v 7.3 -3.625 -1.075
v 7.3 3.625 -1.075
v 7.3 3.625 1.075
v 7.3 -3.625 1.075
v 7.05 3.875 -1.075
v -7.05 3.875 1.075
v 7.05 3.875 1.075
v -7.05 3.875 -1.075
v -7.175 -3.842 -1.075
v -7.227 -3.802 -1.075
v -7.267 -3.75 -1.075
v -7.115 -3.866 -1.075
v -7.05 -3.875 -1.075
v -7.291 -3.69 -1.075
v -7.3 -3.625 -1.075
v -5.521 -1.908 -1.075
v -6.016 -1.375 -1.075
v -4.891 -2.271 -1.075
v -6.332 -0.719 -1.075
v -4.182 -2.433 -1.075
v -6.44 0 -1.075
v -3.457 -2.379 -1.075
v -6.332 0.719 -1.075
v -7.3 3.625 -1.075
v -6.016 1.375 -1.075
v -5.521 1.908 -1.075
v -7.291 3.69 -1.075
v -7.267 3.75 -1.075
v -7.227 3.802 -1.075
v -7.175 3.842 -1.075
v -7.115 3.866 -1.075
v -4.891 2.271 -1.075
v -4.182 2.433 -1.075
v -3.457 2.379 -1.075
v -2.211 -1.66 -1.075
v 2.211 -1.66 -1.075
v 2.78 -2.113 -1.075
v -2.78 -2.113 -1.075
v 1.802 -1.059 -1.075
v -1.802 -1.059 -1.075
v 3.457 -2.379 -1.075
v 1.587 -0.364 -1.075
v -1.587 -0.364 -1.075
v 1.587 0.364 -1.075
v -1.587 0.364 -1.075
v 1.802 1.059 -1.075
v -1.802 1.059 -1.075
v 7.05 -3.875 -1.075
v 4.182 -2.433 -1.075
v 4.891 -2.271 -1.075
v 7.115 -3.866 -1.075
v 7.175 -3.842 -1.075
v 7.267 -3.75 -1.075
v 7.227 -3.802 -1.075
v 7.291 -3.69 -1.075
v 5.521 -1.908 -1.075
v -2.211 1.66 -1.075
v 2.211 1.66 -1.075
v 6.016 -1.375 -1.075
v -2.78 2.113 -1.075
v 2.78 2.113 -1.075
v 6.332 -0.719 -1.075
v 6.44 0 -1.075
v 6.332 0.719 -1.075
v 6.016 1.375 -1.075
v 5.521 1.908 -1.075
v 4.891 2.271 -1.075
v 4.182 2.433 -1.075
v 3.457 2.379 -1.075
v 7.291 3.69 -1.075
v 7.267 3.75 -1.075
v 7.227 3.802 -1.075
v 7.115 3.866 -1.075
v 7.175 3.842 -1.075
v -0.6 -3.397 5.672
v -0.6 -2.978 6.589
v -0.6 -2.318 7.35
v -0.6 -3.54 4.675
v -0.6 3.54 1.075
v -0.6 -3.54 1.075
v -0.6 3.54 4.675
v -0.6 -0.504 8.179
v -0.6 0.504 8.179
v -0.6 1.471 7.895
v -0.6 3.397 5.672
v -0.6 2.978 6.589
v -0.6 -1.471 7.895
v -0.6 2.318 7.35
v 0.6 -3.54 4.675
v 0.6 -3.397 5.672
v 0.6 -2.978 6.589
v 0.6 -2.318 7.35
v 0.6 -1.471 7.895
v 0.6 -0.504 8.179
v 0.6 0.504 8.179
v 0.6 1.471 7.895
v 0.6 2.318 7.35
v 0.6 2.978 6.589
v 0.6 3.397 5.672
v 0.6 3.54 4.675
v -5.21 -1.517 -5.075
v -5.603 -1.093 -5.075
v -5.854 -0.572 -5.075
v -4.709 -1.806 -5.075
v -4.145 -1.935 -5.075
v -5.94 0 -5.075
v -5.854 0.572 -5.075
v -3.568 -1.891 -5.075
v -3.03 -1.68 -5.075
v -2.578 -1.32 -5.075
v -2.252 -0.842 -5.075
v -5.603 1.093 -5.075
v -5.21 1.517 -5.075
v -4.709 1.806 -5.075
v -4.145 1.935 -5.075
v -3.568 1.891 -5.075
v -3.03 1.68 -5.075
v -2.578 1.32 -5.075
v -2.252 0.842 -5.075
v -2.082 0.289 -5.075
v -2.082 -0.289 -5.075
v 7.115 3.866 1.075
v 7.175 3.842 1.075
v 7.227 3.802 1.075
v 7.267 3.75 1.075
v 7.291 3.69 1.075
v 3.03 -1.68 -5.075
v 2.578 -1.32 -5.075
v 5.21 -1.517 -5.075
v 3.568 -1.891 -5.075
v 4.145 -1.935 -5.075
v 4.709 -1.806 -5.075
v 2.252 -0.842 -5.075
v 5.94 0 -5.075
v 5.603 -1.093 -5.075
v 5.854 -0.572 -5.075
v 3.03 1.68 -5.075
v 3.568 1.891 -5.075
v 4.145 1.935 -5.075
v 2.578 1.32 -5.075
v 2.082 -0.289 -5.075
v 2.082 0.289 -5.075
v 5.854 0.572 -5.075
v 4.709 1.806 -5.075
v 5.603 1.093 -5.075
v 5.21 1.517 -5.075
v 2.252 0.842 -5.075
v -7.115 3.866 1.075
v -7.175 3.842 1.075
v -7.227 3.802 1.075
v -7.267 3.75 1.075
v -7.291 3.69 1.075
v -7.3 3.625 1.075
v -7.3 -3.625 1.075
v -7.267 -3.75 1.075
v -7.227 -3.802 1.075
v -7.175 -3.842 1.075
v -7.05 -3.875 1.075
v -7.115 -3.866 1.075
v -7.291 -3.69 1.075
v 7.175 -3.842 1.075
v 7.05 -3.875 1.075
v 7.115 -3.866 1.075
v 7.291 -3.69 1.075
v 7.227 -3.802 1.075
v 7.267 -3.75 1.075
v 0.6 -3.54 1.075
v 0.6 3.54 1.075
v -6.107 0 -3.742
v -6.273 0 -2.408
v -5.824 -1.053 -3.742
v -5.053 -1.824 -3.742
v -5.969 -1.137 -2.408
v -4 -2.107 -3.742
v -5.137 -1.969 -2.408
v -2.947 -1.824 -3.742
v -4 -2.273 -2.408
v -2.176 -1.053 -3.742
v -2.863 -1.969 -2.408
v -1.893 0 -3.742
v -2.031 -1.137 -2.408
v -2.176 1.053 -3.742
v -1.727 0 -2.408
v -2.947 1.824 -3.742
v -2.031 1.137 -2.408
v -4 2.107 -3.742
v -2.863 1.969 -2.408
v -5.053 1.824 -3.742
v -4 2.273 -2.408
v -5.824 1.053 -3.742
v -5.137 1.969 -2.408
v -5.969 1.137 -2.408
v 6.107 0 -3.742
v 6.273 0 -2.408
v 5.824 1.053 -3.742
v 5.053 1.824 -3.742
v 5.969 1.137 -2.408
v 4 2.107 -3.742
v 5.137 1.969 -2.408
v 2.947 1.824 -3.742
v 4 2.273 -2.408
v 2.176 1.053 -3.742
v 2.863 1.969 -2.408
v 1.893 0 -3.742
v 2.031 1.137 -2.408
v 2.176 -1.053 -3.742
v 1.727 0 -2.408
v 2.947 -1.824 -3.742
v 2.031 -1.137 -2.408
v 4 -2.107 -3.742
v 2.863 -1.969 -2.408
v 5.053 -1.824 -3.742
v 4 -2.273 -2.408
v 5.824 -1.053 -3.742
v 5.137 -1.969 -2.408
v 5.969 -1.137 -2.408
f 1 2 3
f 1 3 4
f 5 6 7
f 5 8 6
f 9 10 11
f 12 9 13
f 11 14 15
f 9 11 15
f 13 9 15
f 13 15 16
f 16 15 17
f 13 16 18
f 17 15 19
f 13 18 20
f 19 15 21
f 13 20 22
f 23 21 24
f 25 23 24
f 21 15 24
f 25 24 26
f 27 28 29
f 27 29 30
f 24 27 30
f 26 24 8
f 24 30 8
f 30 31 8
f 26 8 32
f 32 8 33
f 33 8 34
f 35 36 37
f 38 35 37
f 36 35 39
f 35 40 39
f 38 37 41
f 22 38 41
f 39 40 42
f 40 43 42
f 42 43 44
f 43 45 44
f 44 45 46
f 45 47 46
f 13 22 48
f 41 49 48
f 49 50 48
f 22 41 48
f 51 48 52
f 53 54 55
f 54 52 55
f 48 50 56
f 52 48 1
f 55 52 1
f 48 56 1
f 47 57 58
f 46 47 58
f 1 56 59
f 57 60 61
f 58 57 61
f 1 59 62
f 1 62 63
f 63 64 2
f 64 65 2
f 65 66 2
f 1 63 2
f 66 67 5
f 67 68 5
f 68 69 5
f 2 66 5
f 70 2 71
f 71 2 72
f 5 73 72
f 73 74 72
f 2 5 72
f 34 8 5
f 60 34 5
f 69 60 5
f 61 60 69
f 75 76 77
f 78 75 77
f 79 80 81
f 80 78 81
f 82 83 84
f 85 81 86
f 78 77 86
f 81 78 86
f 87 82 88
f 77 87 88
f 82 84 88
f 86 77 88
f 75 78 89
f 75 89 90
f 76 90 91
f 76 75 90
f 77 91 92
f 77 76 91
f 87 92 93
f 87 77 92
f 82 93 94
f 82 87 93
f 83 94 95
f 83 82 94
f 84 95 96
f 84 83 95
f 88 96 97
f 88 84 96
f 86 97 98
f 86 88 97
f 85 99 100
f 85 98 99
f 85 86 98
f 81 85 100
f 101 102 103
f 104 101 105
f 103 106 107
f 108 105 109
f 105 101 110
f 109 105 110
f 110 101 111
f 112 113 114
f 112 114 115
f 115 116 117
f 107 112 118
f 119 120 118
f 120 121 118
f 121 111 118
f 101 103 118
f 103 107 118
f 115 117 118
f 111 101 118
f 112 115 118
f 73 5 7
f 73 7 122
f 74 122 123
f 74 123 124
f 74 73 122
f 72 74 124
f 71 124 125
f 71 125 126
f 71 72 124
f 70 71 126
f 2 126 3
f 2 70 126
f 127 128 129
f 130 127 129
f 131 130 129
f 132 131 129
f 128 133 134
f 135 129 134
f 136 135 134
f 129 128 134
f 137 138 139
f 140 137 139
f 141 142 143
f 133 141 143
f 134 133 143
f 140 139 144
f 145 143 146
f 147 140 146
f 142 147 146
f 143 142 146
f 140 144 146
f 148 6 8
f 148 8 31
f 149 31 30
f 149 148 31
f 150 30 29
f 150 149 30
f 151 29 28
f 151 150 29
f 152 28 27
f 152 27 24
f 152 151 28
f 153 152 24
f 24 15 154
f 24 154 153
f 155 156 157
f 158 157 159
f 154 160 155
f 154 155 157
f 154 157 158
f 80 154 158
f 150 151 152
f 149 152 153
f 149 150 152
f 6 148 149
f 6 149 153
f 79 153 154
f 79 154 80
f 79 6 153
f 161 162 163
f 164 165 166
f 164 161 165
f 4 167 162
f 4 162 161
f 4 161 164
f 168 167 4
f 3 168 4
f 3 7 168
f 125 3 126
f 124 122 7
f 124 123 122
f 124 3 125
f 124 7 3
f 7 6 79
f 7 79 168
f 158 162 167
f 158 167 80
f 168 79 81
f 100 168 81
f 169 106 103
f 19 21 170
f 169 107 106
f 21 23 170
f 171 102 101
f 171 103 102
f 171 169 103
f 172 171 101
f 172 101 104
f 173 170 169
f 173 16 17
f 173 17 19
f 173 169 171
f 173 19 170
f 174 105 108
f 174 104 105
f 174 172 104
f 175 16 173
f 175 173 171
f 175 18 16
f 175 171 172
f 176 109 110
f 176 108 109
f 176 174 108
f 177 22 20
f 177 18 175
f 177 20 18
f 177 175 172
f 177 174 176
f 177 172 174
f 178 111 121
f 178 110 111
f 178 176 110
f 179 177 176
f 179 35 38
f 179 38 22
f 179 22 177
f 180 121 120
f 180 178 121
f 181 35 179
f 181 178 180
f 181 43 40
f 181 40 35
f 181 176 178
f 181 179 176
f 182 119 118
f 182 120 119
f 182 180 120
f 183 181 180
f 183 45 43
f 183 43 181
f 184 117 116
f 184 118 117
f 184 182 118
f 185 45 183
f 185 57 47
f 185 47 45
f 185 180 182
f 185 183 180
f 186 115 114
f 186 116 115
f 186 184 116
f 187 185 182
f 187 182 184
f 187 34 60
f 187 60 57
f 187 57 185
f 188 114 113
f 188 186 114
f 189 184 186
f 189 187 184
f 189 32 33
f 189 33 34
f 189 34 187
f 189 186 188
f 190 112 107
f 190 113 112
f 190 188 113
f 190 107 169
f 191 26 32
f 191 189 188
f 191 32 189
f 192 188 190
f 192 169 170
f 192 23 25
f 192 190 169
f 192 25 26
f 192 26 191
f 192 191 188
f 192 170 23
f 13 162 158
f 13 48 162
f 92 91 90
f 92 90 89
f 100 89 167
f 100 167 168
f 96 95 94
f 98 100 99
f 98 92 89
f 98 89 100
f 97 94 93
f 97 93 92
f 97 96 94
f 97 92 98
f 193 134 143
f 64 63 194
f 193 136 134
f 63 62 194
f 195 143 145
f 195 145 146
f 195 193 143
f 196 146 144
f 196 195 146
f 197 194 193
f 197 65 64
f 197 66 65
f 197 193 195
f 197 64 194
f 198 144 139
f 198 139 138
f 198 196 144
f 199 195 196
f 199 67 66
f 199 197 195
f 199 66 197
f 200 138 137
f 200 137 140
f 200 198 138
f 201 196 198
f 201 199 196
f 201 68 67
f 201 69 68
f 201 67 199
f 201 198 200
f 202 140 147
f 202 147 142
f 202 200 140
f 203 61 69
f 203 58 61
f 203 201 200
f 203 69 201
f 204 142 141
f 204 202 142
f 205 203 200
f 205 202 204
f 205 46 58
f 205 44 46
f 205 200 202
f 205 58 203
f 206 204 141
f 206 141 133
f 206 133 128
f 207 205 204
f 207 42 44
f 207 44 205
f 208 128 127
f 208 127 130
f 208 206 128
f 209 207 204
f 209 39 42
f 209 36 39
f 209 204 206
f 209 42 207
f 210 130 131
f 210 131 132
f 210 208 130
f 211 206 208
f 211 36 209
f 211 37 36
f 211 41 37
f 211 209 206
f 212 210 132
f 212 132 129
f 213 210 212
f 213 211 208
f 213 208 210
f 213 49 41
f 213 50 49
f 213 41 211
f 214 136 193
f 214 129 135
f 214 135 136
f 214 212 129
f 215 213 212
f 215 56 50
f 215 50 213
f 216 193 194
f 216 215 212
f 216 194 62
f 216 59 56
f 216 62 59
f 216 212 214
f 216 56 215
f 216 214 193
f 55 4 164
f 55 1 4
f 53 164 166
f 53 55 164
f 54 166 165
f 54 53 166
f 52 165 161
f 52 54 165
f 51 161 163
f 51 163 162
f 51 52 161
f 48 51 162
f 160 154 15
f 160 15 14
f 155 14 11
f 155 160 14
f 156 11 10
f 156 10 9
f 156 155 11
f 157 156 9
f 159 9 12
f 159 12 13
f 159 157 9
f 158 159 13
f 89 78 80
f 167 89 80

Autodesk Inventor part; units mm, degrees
ref_plane "YZ Plane" through (0, 0, 0) normal (1, 0, 0) x (0, 1, 0)
ref_plane "XZ Plane" through (0, 0, 0) normal (0, 1, 0) x (-1, 0, 0)
ref_plane "XY Plane" through (0, 0, 0) normal (0, 0, 1) x (1, 0, 0)
sketch "Sketch1" plane through (0, 0, 0) normal (0, 0, 1) x (1, 0, 0)
  line L0 (-7.3, 3.875) -> (7.3, 3.875)
  line L1 (7.3, 3.875) -> (7.3, -3.875)
  line L2 (7.3, -3.875) -> (-7.3, -3.875)
  line L3 (-7.3, -3.875) -> (-7.3, 3.875)
  point P0 (0, 0)
  point P1 (-7.3, 0)
  point P2 (0, 3.875)
  dimension "d0" = 14.6
  dimension "d1" = 7.75
extrude "Extrusion1" add sketch "Sketch1" along normal mid plane 2.15
fillet "Fillet1" radius 0.25 4 edges at (-7.3, 3.875, 0) (-7.3, -3.875, 0) (7.3, 3.875, 0) (7.3, -3.875, 0)
sketch "Sketch2" plane through (0, 0, 0) normal (1, 0, 0) x (0, 1, 0)
  line L0 (3.625, 1.075) -> (-3.625, 1.075) construction
  line L1 (3.54, 1.075) -> (3.54, 4.675)
  arc A0 (3.54, 4.675) -> (-3.54, 4.675) centre (0, 4.675) ccw
  line L2 (-3.54, 4.675) -> (-3.54, 1.075)
  line L3 (-3.54, 1.075) -> (3.54, 1.075)
  point P0 (0, 0)
  dimension "d5" = 3.6
  dimension "d6" = 7.08
extrude "Extrusion2" add sketch "Sketch2" along normal mid plane 1.2
sketch "Sketch3" plane through (0, 0, 0) normal (0, 1, 0) x (-1, 0, 0)
  line L0 (7.05, -1.075) -> (-7.05, -1.075) construction
  line L1 (-4, -1.075) -> (-6.44, -1.075)
  line L2 (-6.44, -1.075) -> (-5.94, -5.075)
  line L3 (-5.94, -5.075) -> (-4, -5.075)
  line L4 (-4, -5.075) -> (-4, -1.075)
  point P0 (0, 0)
  dimension "d9" = 4.88
  dimension "d10" = 3.88
  dimension "d11" = 4
  dimension "d12" = 4
revolve "Revolution1" add sketch "Sketch3" angle 360 about axis through (4, 0, -5.075) along (0, 0, 1)
mirror "Mirror1" about plane through (0, 0, 0) normal (1, 0, 0) of "Revolution1"
properties part number "HIPS" material "250"
